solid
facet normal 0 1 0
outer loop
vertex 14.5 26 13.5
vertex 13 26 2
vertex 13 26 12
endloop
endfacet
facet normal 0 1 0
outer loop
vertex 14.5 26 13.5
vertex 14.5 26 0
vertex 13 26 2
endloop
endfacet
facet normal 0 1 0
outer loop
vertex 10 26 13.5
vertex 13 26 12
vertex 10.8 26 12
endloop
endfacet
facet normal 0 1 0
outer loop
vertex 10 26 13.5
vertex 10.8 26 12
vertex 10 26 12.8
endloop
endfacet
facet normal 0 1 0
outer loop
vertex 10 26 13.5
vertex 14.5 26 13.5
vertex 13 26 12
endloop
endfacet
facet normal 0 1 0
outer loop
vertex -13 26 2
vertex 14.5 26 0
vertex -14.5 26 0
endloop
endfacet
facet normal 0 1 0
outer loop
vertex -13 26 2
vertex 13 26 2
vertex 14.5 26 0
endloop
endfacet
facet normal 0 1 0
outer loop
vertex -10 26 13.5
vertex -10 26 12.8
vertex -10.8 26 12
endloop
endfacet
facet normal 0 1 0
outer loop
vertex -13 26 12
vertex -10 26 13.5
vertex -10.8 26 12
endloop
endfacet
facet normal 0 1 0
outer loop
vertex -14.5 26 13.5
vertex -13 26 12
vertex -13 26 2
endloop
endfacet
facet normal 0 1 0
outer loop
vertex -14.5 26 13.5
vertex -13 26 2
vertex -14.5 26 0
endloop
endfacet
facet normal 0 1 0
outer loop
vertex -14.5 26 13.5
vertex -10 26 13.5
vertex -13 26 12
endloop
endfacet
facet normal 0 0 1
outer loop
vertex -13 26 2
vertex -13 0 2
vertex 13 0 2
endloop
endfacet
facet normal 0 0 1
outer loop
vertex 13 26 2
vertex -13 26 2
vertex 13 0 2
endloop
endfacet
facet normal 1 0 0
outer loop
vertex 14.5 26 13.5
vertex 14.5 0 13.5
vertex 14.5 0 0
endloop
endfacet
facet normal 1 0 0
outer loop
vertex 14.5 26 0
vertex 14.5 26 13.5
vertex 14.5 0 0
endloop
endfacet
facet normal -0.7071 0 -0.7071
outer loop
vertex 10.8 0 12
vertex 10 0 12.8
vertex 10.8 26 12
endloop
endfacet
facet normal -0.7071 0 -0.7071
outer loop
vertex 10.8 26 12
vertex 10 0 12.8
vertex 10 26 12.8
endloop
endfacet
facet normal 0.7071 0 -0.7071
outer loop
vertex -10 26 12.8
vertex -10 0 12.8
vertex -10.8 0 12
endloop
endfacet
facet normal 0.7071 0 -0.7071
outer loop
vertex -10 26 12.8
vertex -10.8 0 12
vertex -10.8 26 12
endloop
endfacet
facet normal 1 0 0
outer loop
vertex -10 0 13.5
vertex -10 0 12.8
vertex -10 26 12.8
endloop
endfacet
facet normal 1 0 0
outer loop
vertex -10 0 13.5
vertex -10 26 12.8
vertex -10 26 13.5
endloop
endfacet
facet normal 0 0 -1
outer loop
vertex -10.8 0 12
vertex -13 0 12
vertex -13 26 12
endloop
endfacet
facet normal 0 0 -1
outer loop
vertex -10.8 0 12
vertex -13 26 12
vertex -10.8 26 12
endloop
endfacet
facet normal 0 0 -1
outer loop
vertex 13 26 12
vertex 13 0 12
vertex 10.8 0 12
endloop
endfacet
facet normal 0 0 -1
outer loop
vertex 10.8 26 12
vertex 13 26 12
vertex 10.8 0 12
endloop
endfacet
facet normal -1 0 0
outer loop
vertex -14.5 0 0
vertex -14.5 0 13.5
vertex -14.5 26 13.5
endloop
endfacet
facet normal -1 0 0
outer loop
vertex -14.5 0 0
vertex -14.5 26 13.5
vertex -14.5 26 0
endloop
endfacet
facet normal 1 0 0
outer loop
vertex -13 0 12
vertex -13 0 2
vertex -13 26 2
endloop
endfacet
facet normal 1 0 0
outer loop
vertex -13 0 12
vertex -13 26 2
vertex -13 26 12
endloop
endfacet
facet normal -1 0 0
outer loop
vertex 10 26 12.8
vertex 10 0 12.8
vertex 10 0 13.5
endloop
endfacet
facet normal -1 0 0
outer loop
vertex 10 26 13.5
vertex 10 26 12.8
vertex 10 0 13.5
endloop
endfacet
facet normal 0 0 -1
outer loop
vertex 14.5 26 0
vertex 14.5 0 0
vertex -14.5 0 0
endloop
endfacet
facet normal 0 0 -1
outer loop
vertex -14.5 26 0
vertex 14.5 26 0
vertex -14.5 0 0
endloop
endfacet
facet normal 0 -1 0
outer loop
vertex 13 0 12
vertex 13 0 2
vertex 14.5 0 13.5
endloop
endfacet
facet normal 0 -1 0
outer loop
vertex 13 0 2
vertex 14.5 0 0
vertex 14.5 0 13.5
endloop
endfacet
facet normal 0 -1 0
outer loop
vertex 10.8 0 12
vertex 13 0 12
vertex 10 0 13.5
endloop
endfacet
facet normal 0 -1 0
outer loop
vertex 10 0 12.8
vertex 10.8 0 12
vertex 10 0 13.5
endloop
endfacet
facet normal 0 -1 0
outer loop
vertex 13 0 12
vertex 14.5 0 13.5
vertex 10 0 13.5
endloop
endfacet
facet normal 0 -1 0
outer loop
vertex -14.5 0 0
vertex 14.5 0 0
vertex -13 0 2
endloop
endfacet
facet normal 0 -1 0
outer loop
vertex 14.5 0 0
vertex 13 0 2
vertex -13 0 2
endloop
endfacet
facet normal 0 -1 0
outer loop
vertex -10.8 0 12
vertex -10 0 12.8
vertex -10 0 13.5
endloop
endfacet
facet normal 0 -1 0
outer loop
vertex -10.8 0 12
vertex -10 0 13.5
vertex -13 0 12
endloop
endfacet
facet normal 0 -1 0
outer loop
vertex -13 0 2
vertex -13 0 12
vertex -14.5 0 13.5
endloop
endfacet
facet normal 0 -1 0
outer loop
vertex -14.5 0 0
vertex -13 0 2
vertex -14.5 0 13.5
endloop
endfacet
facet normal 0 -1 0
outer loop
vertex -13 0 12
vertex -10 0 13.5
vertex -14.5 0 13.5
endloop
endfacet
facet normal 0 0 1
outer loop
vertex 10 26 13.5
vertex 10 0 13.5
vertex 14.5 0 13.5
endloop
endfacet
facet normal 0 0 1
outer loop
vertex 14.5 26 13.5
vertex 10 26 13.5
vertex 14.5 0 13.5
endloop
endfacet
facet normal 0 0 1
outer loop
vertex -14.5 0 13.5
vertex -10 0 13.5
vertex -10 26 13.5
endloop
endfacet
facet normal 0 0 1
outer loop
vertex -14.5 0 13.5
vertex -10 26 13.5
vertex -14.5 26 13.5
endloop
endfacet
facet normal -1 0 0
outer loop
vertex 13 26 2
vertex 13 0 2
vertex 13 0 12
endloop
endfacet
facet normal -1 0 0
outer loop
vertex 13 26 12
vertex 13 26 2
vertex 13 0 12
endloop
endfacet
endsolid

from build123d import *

# Parameters (mm, degrees)
F1_DEPTH = 26
F2_SIZE  = 0.8


with BuildPart() as f1:
    # F0 (on Front) → F1 (new body)
    with BuildSketch(Plane.XZ):
        Polygon((-14.5, 0), (0, 0), (0, 2), (-13, 2), (-13, 12), (-10, 12), (-10, 13.5), (-14.5, 13.5), align=None)
    extrude(amount=-F1_DEPTH)

    # F2
    f2_edges = [f1.edges().sort_by_distance(p)[0] for p in [
        (-10, 13, 12),
    ]]
    chamfer(f2_edges, length=F2_SIZE)

    # F3: F1 across plane


with BuildPart() as f1_1:
    add(f1.part)
    add(f1.part.mirror(Plane.YZ))


solid = f1_1.part
